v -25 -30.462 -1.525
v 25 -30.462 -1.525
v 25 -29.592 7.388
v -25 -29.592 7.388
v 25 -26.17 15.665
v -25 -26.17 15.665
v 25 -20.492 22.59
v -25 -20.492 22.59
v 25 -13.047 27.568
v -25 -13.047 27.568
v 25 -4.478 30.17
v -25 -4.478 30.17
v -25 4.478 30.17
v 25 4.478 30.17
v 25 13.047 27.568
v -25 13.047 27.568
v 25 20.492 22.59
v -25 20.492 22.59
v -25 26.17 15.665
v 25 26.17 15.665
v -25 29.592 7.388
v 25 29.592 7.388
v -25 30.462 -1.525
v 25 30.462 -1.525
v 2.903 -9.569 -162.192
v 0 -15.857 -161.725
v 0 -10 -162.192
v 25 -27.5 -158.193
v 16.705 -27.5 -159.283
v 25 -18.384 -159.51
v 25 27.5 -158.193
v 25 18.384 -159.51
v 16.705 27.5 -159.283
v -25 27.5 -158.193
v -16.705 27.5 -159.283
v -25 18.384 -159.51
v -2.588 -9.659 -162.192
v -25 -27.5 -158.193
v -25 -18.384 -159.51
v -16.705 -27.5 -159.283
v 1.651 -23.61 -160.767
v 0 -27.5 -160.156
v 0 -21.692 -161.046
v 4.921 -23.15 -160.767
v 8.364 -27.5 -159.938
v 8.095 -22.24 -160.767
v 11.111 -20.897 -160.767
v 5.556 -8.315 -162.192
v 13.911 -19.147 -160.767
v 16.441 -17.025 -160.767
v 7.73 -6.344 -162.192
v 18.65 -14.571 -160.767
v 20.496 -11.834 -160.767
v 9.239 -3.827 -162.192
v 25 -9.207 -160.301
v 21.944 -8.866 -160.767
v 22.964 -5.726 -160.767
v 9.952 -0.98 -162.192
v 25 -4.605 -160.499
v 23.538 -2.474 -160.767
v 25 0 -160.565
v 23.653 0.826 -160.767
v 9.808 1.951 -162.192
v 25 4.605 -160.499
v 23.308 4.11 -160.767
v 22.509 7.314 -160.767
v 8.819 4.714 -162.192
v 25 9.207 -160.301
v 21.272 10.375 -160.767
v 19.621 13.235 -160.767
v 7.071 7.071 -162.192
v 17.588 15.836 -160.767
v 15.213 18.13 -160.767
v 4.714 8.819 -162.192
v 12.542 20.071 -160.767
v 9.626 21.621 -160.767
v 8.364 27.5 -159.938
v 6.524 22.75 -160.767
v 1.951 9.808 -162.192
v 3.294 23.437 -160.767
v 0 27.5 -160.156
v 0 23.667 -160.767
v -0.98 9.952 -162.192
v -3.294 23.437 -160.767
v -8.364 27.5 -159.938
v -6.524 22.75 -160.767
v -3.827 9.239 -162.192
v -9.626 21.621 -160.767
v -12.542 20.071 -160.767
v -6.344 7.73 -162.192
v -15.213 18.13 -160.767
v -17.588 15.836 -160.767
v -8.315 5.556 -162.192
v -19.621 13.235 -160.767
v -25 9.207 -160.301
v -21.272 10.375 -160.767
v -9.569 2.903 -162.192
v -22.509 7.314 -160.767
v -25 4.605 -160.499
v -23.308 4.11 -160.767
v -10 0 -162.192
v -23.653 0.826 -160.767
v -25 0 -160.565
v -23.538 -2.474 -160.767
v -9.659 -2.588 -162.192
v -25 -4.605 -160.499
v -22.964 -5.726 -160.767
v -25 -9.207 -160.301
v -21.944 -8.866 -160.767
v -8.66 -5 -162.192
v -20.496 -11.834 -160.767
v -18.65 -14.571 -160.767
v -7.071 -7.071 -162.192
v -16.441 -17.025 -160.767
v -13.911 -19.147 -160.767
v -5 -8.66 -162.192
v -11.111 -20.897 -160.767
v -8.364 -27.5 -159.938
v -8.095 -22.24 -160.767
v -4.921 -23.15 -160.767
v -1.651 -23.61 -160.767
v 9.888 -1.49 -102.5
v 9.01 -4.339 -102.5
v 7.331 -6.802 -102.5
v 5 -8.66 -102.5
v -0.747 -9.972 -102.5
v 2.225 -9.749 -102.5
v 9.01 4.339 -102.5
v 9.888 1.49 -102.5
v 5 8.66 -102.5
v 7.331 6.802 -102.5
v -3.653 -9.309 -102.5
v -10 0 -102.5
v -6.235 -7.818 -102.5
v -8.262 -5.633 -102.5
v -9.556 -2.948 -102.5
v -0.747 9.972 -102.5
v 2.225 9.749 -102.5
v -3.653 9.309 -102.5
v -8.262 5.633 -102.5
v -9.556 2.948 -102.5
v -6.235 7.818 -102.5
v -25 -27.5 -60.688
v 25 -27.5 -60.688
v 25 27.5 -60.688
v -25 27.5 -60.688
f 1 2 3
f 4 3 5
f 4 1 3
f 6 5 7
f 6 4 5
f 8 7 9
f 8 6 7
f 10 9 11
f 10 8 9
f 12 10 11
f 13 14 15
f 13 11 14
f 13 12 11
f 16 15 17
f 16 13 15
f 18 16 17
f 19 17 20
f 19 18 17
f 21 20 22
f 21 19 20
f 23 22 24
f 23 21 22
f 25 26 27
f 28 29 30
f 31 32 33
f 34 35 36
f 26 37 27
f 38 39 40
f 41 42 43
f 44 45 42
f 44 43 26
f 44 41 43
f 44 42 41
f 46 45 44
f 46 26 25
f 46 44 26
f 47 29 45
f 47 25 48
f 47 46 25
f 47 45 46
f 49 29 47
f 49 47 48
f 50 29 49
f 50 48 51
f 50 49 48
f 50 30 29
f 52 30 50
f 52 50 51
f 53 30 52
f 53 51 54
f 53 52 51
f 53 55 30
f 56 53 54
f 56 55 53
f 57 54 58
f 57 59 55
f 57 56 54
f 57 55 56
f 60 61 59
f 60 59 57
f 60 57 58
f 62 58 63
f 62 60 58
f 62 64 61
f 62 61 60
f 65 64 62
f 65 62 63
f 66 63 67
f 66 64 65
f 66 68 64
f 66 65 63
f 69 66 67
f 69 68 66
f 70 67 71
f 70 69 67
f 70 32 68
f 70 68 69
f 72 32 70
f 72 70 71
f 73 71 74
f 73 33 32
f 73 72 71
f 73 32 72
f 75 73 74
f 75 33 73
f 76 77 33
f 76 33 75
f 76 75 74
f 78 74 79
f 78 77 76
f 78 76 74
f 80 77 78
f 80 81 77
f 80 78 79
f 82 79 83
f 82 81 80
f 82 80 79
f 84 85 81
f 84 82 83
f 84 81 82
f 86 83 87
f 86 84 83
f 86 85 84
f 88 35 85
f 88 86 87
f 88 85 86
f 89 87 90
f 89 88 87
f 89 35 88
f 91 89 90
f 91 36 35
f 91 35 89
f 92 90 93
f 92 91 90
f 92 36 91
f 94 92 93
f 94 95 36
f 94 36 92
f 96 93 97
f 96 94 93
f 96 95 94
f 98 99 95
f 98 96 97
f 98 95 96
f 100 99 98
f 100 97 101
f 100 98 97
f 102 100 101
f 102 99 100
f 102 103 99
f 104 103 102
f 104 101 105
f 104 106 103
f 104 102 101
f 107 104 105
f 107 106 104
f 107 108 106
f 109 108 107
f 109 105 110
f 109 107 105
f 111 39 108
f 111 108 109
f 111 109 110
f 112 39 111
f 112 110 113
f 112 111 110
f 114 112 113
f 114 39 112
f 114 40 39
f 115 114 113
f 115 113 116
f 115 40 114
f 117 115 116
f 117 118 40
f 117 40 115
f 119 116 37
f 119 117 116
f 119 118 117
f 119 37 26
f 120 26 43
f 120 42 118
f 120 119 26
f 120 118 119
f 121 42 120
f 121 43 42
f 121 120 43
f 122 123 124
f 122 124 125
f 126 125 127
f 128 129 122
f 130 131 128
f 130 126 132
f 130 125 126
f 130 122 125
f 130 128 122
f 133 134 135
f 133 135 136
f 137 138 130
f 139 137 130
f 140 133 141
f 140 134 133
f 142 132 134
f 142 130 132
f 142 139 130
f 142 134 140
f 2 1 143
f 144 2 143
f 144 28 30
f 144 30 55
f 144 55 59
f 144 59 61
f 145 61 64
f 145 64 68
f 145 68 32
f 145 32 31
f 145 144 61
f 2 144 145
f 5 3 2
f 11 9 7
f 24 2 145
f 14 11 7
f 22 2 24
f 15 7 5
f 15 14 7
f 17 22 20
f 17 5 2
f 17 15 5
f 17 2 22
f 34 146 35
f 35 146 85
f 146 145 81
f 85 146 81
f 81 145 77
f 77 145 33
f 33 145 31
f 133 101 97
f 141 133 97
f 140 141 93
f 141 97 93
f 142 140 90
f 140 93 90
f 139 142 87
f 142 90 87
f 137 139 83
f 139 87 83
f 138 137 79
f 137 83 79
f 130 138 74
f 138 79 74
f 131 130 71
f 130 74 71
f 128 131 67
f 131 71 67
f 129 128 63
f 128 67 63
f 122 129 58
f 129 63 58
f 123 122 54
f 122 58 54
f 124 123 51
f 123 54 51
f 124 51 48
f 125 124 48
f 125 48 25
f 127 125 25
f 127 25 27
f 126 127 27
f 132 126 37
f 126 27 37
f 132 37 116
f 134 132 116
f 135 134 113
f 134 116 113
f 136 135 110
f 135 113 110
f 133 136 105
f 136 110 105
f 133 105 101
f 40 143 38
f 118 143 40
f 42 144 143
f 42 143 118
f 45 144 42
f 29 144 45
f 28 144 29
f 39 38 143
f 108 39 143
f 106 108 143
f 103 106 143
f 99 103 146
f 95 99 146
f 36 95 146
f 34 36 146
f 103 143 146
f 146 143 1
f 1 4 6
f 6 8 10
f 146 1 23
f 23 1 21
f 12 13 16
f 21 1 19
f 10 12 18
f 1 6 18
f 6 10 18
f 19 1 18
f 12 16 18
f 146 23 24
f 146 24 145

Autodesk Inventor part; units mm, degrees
ref_plane "YZ Plane" through (0, 0, 0) normal (1, 0, 0) x (0, 1, 0)
ref_plane "XY Plane" through (0, 0, 0) normal (0, 0, 1) x (1, 0, 0)
ref_plane "UCS1: YZ Plane" through (0, 0, 0) normal (1, 0, 0) x (0, 1, 0)
sketch "Sketch2" plane through (0, 0, 0) normal (1, 0, 0) x (0, 1, 0)
  circle A0 centre (0, -60) radius 27.5
  line L0 (27.5, -162.5) -> (-27.5, -162.5)
  line L1 (0, -60) -> (0, -162.5) construction
  line L2 (-27.5, -60) -> (-27.5, -162.5)
  line L3 (27.5, -60) -> (27.5, -162.5)
  circle A1 centre (0, 0) radius 30.5
  line L4 (-30.4619, -1.525) -> (-27.4656, -61.375)
  line L5 (30.4619, -1.525) -> (27.4656, -61.375)
  line L6 (30.5382, 0) -> (-30.5382, 0)
  point P0 (-30.5, 0)
  point P1 (30.5, 0)
  point P2 (-30.5, 0)
  point P3 (-27.5, -60.6879)
  point P4 (27.5, -60.6879)
  dimension "d1" = 55
  dimension "d3" = 55
  dimension "d26" = 61
  dimension "d33" = 60
  dimension "d39" = 162.5
extrude "Extrusion1" add sketch "Sketch2" along normal mid plane 50 contours A0
extrude "Extrusion2" add sketch "Sketch2" against normal blind 50 from surface at 25 contours L3 L5 A0 | A0 L4 L2 | L5 L3 L0 L2 L4 A0
sketch "Sketch5" plane through (25, -27.5, -162.5) normal (0, 0, -1) x (-1, 0, 0)
  circle A0 centre (25, 27.5) radius 10
  line L0 (50, 55) -> (50, 0) projected
  line L1 (50, 55) -> (0, 55) projected
  point P0 (25, 27.5)
  point P1 (50, 27.5)
  point P2 (-45, 0)
  point P3 (25, 55)
  dimension "d22" = 20
extrude "Extrusion4" cut sketch "Sketch5" against normal blind 60
ref_plane "Work Plane1" through (0, 0, -60) normal (-1, 0, 0) x (0, 0, -1)
sketch "Sketch4" plane through (0, 0, -60) normal (-1, 0, 0) x (0, 0, -1)
  circle A0 centre (-60, 0) radius 162.5
  line L0 (102.5, -27.5) -> (102.5, 27.5) projected
  line L1 (-222.5, 0) -> (102.5, 0)
  line L2 (102.5, 0) -> (102.5, 27.5)
  line L3 (102.5, 27.5) -> (0, 27.5) projected
  line L4 (102.5, 27.5) -> (102.5, 40.4047)
  line L5 (102.5, 40.4047) -> (97.3967, 40.4047)
  point P0 (100.1562, 27.5)
  point P1 (102.5, 0)
revolve "Revolution1" cut sketch "Sketch4" angle 360 about axis through (0, 0, 162.5) along (0, 0, -1) contours L5 L4 L3 A0 | L3 L0 A0
extrude "Extrusion5" add sketch "Sketch2" along normal mid plane 50 contours A0 L2 L4 A1 L5 L3 | A1 L6 | L6 A1
properties part number "shank_inventor"
